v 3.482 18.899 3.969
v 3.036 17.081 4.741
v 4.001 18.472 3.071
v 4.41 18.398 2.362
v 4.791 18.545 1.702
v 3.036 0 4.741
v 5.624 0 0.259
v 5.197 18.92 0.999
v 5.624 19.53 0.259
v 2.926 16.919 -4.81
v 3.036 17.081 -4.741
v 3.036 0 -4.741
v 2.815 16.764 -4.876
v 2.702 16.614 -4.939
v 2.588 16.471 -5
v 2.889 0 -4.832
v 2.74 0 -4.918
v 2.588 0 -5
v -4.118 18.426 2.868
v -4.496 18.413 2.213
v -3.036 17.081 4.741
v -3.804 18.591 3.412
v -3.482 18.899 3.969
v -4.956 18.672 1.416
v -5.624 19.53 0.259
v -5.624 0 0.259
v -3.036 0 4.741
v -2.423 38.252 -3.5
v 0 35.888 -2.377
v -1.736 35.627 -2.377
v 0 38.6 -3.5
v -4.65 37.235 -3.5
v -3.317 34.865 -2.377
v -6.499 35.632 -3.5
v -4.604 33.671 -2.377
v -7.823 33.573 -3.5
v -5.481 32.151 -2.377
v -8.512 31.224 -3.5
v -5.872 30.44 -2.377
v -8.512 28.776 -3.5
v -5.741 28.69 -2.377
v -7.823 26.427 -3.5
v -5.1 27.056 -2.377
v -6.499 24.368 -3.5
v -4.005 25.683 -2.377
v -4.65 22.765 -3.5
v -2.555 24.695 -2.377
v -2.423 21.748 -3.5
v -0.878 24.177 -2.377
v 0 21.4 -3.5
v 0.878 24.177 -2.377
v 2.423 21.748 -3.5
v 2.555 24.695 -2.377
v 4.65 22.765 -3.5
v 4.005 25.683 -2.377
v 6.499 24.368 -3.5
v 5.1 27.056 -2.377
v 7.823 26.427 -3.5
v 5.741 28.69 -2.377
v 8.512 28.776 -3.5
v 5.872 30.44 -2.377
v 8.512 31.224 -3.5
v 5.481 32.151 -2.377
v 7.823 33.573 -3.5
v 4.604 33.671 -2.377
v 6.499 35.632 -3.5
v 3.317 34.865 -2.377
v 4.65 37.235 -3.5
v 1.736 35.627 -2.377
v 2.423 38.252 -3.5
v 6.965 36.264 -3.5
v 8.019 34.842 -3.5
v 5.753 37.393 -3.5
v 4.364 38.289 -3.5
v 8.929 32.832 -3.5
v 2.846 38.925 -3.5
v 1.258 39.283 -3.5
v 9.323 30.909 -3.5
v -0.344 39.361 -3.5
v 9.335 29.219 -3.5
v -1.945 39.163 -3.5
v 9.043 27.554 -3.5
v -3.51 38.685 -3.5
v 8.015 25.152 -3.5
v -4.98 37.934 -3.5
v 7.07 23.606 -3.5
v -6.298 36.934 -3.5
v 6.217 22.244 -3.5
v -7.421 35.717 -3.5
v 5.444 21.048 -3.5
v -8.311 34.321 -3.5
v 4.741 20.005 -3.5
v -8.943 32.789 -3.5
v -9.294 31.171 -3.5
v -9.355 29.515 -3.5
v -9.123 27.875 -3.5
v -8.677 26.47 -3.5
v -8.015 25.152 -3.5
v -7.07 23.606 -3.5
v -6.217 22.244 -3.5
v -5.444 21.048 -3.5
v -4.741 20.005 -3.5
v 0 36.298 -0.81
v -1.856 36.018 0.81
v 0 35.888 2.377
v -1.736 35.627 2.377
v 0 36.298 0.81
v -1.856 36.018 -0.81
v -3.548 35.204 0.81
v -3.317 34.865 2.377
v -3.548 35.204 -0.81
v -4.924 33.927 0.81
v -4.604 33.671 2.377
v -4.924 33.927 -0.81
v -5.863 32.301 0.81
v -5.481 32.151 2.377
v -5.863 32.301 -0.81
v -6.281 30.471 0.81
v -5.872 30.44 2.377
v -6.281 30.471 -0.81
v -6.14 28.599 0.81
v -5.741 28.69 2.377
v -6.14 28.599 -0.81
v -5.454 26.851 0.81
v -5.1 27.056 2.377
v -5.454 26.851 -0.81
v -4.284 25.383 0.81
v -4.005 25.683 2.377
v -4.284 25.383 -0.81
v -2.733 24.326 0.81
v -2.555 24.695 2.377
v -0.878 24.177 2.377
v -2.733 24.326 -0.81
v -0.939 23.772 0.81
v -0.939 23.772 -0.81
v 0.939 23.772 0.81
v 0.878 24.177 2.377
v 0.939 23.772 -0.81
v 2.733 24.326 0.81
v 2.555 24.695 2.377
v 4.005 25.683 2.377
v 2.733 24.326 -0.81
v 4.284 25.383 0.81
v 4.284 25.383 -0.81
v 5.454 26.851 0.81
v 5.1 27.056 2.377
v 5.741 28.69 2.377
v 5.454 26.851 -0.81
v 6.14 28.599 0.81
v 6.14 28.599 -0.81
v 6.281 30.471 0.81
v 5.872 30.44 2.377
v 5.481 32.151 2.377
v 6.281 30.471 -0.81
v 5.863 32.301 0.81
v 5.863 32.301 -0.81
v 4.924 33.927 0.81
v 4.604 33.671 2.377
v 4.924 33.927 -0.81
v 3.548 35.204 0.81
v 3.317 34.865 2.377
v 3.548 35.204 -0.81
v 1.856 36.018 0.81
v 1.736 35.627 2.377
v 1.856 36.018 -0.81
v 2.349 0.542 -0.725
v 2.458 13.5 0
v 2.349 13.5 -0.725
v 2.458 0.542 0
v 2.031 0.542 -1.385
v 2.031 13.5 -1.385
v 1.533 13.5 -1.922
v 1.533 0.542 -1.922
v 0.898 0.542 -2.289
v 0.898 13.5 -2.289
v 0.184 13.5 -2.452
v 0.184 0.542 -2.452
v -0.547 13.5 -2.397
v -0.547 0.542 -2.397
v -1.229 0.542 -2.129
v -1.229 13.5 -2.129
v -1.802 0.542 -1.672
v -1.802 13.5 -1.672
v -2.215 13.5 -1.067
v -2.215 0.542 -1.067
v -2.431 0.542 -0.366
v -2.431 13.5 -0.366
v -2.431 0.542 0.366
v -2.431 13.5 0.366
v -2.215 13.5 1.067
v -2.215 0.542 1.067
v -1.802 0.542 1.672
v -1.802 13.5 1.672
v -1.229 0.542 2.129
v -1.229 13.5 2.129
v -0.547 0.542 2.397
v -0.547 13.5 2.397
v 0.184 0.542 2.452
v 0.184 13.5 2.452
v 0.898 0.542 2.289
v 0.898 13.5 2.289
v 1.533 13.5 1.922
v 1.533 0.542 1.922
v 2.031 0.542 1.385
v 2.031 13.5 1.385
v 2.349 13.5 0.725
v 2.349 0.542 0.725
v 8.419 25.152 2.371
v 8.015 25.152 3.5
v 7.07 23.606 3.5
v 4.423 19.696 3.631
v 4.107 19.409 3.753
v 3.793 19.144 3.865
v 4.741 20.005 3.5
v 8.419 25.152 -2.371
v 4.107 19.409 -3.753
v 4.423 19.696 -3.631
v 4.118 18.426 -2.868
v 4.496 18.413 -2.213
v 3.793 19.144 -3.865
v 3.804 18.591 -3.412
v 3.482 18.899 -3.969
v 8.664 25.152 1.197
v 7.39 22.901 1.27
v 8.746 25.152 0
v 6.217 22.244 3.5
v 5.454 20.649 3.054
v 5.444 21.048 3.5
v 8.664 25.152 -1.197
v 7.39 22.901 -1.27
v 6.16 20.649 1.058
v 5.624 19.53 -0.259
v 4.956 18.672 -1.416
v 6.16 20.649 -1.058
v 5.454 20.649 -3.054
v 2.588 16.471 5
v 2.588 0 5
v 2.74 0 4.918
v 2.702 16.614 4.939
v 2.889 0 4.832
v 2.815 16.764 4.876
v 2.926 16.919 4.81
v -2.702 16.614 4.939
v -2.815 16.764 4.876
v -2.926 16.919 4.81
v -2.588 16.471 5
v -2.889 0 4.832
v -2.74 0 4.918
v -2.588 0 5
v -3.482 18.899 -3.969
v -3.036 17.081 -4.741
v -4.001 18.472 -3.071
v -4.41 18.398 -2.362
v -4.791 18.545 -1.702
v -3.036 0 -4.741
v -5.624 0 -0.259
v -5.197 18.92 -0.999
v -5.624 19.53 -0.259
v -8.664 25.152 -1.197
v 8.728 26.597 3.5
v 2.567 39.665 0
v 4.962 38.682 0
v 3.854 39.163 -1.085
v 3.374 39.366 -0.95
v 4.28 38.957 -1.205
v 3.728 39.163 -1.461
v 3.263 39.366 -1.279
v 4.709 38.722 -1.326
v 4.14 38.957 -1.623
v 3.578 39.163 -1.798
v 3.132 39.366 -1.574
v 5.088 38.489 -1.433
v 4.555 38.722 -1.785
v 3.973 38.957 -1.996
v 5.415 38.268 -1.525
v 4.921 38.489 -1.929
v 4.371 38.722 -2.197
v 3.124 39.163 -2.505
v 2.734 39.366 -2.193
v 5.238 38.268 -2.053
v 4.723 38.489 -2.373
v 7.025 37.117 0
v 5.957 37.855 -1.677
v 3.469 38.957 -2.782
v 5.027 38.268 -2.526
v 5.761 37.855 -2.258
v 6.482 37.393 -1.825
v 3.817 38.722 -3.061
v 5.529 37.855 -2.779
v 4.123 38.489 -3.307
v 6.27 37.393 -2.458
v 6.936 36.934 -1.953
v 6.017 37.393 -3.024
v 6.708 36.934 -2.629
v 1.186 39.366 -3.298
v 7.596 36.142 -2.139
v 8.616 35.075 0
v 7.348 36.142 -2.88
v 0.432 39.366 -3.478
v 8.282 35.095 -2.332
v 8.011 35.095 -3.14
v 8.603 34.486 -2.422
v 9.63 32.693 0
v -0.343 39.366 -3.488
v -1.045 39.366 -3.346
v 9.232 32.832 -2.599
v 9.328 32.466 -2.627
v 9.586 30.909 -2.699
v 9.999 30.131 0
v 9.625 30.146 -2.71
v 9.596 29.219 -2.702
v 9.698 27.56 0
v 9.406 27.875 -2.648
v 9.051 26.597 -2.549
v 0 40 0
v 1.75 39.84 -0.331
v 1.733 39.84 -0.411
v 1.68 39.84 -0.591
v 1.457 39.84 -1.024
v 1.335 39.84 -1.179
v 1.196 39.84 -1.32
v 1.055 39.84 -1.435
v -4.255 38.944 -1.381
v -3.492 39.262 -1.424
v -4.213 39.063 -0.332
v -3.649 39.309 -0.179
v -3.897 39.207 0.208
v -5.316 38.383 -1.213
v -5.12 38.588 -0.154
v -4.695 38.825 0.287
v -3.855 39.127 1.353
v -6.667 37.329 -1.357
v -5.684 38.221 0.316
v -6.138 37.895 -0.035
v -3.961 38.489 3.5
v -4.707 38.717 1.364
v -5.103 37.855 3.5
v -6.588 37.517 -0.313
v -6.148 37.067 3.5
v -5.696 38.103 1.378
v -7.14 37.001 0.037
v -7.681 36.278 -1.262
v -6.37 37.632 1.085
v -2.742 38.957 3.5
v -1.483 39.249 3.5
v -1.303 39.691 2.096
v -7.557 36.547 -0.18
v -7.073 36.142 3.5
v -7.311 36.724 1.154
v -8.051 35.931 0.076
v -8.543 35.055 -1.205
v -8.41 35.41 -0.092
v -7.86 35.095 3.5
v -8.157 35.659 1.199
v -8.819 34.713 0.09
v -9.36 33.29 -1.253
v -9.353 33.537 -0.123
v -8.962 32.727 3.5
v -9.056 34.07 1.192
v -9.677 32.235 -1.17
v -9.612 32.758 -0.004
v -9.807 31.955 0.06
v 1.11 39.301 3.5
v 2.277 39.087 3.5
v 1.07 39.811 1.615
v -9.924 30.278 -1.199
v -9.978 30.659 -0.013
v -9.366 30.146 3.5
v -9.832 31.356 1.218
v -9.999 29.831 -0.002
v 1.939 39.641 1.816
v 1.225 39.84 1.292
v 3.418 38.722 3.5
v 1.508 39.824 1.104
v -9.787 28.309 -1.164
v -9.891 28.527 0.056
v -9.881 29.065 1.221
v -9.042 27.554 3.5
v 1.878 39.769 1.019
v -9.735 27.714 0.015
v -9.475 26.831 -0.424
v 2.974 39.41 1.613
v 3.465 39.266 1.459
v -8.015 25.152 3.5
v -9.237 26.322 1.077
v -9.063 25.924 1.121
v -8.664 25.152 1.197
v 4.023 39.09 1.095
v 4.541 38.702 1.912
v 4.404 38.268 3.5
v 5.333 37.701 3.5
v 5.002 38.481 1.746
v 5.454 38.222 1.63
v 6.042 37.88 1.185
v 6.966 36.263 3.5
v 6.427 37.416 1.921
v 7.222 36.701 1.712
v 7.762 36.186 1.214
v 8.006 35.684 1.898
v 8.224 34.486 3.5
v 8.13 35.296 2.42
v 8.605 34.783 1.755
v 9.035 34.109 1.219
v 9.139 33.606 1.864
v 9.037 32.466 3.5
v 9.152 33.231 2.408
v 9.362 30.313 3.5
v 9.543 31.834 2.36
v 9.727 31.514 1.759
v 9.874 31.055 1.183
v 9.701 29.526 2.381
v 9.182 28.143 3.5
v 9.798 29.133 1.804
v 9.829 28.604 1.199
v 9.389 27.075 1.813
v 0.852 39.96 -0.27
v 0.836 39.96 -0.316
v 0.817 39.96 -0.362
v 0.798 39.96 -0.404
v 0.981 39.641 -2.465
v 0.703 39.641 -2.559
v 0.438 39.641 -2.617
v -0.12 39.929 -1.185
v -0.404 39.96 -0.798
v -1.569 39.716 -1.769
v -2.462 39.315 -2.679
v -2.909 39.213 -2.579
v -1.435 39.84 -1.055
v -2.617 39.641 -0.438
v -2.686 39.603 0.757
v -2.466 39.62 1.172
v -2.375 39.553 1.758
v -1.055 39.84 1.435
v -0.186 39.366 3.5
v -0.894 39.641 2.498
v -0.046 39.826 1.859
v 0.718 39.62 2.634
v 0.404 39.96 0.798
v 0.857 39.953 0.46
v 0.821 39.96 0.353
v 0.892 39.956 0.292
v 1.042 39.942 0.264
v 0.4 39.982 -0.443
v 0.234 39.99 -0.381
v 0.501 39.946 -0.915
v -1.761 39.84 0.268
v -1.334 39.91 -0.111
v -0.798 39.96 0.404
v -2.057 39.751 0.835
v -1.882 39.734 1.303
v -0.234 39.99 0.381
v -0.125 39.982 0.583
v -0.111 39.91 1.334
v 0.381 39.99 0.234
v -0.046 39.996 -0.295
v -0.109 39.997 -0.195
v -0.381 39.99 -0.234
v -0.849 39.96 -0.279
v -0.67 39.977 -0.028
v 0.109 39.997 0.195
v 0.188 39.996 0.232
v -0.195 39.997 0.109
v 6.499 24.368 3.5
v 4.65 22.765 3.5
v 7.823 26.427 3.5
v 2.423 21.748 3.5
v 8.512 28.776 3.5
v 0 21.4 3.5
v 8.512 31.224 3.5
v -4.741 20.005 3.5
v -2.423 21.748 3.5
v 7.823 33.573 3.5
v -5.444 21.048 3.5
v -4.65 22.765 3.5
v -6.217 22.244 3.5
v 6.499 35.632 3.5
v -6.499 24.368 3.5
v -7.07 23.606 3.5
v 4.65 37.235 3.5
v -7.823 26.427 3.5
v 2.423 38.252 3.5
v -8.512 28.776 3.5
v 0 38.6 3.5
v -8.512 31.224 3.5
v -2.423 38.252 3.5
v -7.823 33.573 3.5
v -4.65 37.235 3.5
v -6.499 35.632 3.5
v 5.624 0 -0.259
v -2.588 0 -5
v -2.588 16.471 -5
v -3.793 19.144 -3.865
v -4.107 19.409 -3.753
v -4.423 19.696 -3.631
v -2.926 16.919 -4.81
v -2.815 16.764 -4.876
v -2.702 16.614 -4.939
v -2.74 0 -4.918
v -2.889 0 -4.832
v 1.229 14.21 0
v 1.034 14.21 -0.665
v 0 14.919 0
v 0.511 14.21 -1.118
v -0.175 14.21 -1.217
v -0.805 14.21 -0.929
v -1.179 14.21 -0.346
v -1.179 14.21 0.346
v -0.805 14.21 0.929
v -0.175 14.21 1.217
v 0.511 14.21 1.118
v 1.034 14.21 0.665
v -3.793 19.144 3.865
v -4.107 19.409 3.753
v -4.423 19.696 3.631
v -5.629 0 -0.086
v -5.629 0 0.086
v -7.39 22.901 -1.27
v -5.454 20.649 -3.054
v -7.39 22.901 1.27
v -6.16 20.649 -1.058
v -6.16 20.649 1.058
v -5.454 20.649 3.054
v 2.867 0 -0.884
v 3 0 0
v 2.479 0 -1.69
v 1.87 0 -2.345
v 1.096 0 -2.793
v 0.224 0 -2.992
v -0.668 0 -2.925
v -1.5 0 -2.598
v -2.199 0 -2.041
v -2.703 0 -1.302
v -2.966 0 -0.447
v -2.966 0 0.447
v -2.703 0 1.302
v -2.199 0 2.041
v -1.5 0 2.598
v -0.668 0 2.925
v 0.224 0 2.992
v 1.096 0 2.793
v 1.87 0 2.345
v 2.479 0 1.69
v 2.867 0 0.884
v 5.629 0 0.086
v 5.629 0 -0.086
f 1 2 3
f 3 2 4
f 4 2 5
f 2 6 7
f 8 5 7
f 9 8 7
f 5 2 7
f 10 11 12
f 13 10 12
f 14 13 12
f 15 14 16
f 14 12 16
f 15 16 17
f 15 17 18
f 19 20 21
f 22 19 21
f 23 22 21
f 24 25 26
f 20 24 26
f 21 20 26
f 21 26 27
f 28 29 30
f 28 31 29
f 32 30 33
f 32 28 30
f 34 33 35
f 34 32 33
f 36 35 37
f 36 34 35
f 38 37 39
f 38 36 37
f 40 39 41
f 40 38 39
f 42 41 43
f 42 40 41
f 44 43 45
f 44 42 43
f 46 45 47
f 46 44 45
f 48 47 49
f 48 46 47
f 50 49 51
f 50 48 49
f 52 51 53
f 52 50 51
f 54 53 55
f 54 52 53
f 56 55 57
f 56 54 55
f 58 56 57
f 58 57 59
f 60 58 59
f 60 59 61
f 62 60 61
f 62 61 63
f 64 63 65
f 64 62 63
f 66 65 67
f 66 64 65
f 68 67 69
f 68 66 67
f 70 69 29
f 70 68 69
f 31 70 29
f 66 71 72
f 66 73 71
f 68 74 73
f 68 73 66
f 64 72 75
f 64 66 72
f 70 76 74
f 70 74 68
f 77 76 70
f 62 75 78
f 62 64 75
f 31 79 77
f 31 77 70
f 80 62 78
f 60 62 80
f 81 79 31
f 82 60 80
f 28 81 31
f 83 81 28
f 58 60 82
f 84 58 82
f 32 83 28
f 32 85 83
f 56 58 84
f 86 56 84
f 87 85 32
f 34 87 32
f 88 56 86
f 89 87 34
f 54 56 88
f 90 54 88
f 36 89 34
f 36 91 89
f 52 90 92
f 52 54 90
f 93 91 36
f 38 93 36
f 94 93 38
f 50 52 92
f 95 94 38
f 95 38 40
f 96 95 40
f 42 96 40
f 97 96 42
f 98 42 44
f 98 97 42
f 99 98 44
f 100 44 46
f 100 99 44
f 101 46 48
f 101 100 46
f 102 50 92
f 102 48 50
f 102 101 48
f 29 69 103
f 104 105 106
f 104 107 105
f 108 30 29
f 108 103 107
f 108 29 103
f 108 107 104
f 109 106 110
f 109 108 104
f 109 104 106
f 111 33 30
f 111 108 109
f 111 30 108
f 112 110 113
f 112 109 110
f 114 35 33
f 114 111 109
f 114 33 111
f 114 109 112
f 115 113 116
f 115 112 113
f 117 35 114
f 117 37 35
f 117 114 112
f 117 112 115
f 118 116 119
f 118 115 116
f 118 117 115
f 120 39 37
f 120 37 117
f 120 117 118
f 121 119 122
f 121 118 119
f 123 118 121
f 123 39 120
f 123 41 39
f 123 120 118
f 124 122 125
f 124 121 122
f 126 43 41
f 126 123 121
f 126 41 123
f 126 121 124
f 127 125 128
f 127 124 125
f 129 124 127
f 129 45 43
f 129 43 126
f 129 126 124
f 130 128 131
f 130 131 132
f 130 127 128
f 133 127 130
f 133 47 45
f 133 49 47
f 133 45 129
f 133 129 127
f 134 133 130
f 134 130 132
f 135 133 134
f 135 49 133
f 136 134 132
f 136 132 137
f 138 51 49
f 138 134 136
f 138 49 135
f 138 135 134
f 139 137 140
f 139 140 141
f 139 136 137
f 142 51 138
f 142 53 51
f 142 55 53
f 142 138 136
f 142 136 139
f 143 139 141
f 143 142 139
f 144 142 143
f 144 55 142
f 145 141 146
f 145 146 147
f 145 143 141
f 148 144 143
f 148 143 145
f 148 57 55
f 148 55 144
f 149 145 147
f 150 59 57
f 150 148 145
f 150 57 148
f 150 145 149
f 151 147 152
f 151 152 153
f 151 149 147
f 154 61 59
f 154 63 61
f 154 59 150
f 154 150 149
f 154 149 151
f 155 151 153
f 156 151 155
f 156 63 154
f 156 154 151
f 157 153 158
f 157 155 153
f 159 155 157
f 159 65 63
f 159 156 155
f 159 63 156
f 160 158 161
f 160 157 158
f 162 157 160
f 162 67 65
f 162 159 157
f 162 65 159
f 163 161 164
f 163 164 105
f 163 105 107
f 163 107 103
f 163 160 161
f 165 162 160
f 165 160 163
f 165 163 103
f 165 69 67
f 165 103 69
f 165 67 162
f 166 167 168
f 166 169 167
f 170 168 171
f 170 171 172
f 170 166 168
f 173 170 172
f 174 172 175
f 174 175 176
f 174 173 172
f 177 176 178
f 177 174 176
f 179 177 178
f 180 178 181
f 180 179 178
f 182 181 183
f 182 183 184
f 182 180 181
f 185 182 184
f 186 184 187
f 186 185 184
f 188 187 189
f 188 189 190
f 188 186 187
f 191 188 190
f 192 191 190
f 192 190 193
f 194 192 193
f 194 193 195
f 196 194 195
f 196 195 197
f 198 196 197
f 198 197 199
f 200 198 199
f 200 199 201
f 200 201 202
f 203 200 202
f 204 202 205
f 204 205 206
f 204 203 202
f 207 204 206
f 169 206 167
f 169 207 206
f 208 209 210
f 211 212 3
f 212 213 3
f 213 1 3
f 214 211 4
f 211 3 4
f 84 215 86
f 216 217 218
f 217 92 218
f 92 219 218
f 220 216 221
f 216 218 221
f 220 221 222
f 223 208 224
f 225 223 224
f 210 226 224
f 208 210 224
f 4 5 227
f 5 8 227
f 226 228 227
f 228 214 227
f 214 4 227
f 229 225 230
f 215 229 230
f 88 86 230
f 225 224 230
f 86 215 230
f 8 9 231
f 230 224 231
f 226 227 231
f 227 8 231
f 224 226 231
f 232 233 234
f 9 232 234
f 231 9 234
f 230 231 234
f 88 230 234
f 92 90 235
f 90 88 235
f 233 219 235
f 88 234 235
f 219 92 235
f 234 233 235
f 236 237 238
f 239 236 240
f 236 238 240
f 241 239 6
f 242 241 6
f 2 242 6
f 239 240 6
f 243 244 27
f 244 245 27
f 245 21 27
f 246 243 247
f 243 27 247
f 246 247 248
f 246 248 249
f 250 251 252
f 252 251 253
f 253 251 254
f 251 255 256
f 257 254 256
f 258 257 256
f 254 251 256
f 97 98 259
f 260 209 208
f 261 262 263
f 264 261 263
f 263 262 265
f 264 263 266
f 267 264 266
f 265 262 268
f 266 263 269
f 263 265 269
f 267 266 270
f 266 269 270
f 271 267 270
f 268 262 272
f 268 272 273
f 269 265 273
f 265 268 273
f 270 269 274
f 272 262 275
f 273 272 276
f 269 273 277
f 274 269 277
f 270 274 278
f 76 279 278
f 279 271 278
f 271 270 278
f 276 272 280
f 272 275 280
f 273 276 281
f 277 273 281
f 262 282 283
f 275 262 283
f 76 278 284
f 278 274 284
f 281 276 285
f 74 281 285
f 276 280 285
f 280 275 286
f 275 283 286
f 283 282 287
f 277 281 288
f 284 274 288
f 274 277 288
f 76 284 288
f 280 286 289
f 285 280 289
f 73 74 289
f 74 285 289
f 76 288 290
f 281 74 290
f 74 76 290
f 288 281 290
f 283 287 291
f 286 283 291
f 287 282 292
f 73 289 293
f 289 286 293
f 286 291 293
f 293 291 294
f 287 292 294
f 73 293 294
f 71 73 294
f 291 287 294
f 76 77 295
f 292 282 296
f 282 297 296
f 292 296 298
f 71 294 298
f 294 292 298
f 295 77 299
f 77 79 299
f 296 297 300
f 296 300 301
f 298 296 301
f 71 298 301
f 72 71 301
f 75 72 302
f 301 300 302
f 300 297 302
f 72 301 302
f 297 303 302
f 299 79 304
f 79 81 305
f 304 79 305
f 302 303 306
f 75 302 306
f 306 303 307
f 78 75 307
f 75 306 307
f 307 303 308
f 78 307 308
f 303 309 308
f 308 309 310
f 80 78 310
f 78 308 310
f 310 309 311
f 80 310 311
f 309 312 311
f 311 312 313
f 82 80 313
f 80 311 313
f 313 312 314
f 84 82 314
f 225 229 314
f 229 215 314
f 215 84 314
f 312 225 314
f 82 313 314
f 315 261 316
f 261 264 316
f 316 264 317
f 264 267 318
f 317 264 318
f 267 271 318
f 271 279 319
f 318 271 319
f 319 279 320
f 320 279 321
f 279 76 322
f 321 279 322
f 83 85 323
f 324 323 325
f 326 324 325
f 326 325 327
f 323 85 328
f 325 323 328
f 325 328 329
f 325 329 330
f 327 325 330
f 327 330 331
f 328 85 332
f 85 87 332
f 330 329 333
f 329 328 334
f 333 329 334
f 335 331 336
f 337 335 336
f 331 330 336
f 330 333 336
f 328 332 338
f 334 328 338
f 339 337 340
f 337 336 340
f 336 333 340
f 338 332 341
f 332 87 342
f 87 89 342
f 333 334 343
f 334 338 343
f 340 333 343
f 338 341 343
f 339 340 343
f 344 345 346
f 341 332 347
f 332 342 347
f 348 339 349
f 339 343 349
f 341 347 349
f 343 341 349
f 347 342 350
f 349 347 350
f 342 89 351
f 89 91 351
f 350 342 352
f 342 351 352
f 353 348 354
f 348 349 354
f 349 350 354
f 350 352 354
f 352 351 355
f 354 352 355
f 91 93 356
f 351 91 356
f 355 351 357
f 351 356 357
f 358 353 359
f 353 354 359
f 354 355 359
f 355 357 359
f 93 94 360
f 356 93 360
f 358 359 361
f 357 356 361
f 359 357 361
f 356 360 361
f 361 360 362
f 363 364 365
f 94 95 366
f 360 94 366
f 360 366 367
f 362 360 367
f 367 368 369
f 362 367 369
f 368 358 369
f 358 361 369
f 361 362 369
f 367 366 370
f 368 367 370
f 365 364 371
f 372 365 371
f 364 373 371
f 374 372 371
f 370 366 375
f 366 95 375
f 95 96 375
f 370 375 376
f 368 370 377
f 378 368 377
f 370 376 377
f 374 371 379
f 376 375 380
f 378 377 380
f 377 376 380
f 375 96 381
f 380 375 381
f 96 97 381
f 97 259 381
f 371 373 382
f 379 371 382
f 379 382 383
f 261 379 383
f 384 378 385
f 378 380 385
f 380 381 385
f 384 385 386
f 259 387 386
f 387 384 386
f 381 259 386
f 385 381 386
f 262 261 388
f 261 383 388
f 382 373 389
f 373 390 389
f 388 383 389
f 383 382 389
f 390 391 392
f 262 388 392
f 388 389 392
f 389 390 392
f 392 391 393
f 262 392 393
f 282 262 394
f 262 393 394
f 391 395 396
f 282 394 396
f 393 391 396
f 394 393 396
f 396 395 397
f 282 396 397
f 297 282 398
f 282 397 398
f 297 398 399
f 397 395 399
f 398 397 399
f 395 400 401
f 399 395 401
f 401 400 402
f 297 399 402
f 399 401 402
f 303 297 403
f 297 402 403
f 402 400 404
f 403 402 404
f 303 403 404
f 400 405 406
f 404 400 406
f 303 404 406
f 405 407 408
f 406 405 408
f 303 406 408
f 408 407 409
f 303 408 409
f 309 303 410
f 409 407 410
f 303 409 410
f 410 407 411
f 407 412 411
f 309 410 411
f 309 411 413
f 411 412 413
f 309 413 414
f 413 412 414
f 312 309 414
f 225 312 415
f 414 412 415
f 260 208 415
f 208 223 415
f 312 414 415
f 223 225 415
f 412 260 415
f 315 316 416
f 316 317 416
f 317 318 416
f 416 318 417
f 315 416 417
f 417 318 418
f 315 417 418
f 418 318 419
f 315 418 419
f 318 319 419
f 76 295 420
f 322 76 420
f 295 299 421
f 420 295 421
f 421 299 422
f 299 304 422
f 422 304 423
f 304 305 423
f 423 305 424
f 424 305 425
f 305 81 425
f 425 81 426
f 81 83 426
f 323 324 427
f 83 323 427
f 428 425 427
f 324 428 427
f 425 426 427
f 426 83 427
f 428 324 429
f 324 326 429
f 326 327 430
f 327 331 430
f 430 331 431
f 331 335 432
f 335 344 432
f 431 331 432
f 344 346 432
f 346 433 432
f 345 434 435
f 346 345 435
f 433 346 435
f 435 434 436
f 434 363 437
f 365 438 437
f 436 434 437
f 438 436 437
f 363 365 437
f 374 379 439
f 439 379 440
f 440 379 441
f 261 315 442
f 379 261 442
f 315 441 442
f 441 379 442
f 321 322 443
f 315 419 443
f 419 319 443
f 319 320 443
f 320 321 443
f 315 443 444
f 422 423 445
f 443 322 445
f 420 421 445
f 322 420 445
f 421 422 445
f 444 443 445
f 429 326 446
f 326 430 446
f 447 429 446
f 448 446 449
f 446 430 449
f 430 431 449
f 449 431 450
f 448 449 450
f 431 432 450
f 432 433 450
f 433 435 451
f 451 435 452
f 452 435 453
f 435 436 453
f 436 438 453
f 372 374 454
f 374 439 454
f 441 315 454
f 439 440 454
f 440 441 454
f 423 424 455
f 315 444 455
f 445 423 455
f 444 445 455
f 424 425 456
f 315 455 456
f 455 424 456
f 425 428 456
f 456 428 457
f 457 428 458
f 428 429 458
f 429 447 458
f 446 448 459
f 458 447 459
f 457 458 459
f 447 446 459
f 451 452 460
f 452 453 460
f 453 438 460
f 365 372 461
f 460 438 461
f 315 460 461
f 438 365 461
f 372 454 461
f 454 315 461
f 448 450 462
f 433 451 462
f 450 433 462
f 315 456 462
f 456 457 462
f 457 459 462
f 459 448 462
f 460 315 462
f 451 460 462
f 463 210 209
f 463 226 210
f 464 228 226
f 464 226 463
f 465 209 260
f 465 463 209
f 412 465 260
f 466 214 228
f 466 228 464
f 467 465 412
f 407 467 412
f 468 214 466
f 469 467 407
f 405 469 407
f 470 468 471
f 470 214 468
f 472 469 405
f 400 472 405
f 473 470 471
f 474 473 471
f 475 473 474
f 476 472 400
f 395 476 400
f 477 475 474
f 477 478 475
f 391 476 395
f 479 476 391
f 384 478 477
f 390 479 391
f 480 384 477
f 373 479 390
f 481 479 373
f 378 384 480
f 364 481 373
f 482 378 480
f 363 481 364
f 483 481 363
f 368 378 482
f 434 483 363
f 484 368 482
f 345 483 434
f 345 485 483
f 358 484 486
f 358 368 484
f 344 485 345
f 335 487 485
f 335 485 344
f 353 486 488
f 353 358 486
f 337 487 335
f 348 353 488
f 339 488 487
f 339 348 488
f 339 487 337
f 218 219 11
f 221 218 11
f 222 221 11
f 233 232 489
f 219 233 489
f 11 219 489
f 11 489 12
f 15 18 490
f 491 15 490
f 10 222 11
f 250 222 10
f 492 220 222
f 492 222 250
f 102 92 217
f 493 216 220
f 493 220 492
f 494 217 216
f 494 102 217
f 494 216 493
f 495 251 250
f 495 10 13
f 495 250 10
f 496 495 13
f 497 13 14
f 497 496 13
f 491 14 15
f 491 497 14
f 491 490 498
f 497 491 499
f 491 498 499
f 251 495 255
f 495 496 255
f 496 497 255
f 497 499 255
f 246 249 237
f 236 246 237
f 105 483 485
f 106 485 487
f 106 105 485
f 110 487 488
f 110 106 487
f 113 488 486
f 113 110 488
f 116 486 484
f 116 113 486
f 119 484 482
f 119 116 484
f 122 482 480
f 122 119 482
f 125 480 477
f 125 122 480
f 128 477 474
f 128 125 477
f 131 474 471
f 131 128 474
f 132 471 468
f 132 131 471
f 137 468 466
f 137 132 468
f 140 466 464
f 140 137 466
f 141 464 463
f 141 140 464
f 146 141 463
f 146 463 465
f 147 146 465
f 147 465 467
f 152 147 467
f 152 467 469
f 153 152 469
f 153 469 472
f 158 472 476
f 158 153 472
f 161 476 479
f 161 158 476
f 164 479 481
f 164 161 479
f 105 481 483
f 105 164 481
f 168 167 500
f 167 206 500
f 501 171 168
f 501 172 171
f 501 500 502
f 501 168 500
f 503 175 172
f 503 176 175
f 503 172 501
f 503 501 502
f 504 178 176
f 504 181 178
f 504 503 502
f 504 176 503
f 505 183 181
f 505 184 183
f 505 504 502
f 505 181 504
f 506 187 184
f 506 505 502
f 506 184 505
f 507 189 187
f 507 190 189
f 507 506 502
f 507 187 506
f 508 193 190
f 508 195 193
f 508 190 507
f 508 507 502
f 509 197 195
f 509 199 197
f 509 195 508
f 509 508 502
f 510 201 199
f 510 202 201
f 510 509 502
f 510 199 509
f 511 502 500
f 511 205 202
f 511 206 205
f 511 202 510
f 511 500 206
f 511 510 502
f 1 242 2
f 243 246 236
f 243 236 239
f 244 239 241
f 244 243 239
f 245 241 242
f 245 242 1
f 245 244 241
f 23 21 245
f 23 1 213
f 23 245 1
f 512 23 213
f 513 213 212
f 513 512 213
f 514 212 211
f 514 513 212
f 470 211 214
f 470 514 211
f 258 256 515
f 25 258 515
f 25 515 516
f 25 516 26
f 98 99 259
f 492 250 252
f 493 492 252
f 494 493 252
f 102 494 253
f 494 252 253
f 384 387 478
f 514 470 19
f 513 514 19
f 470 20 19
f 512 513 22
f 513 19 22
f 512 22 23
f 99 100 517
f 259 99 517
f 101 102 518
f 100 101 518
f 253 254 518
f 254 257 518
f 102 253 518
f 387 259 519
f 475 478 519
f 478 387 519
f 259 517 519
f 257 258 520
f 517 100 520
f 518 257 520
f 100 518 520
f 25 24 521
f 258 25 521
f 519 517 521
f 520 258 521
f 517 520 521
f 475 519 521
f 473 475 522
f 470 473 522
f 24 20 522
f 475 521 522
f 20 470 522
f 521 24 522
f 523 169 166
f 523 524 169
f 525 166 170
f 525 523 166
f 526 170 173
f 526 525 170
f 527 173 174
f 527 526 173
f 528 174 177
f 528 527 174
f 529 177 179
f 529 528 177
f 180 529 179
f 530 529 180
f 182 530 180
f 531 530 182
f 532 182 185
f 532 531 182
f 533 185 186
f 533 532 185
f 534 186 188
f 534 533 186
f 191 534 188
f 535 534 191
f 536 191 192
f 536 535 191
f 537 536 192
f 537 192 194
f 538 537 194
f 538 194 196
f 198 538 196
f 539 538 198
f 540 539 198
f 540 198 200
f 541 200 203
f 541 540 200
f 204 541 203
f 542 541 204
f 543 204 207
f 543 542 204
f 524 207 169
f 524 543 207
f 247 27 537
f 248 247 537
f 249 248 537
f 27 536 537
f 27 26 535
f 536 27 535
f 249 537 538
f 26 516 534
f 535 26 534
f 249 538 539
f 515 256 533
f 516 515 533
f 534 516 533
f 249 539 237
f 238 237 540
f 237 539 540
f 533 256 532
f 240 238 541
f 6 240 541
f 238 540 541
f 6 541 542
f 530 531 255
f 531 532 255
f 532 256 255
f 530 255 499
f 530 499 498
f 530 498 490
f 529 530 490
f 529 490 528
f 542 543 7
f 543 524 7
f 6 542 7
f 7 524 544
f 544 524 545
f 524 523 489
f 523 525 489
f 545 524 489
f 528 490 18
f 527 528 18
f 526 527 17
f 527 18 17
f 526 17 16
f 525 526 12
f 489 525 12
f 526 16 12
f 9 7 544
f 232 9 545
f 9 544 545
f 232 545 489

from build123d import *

# Parameters (mm, degrees)
BOSS_EXTRUDE1_DEPTH     = 30
CUT_EXTRUDE1_DEPTH      = 11
CUT_EXTRUDE1_DEPTH_BACK = 11


with BuildPart() as part:
    # Sketch1 → Boss-Extrude1 (new body)
    with BuildSketch(Plane(origin=(0, 0, 0), x_dir=(1, 0, 0), z_dir=(0, 1, 0))):
        with BuildLine():
            Line((-5.624045, -0.258867), (-3.036209, -4.741133))
            ThreePointArc((-3.036209, -4.741133), (-2.815, -4.875723), (-2.587837, -5))
            Line((-2.587837, -5), (2.587837, -5))
            ThreePointArc((2.587837, -5), (2.815, -4.875723), (3.036209, -4.741133))
            Line((3.036209, -4.741133), (5.624045, -0.258867))
            ThreePointArc((5.624045, -0.258867), (5.63, 0), (5.624045, 0.258867))
            Line((5.624045, 0.258867), (3.036209, 4.741133))
            ThreePointArc((3.036209, 4.741133), (2.815, 4.875723), (2.587837, 5))
            Line((2.587837, 5), (-2.587837, 5))
            ThreePointArc((-2.587837, 5), (-2.815, 4.875723), (-3.036209, 4.741133))
            Line((-3.036209, 4.741133), (-5.624045, 0.258867))
            ThreePointArc((-5.624045, 0.258867), (-5.63, 0), (-5.624045, -0.258867))
        make_face()
    extrude(amount=BOSS_EXTRUDE1_DEPTH)

    # Sketch2 → Revolve1 (revolve)
    with BuildSketch(Plane.XY):
        with BuildLine():
            Line((8.746197, 25.151904), (0, 9.373347))
            Line((0, 9.373347), (0, 40))
            ThreePointArc((0, 40), (8.616292, 35.075384), (8.746197, 25.151904))
        make_face()
    revolve(axis=Axis((0, 9.373347, 0), (0, 1, 0)))

    # Sketch3 → Cut-Extrude1 (cut, two sides: drawn at the far end of the back side and taken through both)
    with BuildSketch(Plane(origin=(0, 0, 0), x_dir=(0, 0, -1), z_dir=(1, 0, 0)).offset(-CUT_EXTRUDE1_DEPTH_BACK)):
        Polygon((-11, 10), (-7.746665, 10), (-3.5, 20.004517), (-3.5, 40), (3.5, 40), (3.5, 20.004517), (7.746665, 10), (11, 10), (11, 50), (-11, 50), align=None)
    extrude(amount=CUT_EXTRUDE1_DEPTH + CUT_EXTRUDE1_DEPTH_BACK, mode=Mode.SUBTRACT)

    # Sketch4 → Cut-Revolve1 (revolve, cut)
    with BuildSketch(Plane.XY):
        Polygon((0, 14.919416), (2.4585, 13.5), (2.4585, 0.5415), (3, 0), (0, 0), align=None)
    revolve(axis=Axis((0, 0, 0), (0, 1, 0)), mode=Mode.SUBTRACT)

    # Sketch5 → Cut-Revolve2 (revolve, cut)
    with BuildSketch(Plane(origin=(0, 0, 0), x_dir=(0, 0, -1), z_dir=(1, 0, 0))):
        with BuildLine():
            Line((-4.5, 30), (-4.5, 38.6))
            Line((-4.5, 38.6), (-3.5, 38.6))
            Line((-3.5, 38.6), (-2.376818, 35.888398))
            ThreePointArc((-2.376818, 35.888398), (0, 36.35), (2.376818, 35.888398))
            Line((2.376818, 35.888398), (3.5, 38.6))
            Line((3.5, 38.6), (4.5, 38.6))
            Line((4.5, 38.6), (4.5, 30))
            Line((4.5, 30), (-4.5, 30))
        make_face()
    revolve(axis=Axis((0, 30, -4.5), (0, 0, 1)), mode=Mode.SUBTRACT)


solid = part.part
